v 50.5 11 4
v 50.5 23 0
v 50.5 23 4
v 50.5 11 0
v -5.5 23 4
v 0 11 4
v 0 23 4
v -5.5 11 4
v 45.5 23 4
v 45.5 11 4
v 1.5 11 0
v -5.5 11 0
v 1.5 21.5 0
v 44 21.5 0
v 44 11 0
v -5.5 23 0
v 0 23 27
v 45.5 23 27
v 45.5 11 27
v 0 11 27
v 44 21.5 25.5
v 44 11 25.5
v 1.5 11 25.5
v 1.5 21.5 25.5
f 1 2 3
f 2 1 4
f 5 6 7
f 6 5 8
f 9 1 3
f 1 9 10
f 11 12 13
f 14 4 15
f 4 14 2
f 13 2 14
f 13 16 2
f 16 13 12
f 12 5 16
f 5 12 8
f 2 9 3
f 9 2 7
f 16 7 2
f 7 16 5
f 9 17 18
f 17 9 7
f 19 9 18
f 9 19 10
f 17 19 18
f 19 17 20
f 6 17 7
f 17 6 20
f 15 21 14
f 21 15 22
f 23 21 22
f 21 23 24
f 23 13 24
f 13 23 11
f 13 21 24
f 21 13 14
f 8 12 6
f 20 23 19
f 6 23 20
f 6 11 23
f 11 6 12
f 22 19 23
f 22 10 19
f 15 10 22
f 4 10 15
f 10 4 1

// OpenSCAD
module top()
{
translate([-5.5, 0,0])
cube([56,23,4]);
cube([45.5,23,27]);
}

difference() 
{
top();
translate([1.5, 1.5,-4.5])
cube([42.5,20,30]);
translate([-7, -4,-1])
cube([60,15,30]);
}
